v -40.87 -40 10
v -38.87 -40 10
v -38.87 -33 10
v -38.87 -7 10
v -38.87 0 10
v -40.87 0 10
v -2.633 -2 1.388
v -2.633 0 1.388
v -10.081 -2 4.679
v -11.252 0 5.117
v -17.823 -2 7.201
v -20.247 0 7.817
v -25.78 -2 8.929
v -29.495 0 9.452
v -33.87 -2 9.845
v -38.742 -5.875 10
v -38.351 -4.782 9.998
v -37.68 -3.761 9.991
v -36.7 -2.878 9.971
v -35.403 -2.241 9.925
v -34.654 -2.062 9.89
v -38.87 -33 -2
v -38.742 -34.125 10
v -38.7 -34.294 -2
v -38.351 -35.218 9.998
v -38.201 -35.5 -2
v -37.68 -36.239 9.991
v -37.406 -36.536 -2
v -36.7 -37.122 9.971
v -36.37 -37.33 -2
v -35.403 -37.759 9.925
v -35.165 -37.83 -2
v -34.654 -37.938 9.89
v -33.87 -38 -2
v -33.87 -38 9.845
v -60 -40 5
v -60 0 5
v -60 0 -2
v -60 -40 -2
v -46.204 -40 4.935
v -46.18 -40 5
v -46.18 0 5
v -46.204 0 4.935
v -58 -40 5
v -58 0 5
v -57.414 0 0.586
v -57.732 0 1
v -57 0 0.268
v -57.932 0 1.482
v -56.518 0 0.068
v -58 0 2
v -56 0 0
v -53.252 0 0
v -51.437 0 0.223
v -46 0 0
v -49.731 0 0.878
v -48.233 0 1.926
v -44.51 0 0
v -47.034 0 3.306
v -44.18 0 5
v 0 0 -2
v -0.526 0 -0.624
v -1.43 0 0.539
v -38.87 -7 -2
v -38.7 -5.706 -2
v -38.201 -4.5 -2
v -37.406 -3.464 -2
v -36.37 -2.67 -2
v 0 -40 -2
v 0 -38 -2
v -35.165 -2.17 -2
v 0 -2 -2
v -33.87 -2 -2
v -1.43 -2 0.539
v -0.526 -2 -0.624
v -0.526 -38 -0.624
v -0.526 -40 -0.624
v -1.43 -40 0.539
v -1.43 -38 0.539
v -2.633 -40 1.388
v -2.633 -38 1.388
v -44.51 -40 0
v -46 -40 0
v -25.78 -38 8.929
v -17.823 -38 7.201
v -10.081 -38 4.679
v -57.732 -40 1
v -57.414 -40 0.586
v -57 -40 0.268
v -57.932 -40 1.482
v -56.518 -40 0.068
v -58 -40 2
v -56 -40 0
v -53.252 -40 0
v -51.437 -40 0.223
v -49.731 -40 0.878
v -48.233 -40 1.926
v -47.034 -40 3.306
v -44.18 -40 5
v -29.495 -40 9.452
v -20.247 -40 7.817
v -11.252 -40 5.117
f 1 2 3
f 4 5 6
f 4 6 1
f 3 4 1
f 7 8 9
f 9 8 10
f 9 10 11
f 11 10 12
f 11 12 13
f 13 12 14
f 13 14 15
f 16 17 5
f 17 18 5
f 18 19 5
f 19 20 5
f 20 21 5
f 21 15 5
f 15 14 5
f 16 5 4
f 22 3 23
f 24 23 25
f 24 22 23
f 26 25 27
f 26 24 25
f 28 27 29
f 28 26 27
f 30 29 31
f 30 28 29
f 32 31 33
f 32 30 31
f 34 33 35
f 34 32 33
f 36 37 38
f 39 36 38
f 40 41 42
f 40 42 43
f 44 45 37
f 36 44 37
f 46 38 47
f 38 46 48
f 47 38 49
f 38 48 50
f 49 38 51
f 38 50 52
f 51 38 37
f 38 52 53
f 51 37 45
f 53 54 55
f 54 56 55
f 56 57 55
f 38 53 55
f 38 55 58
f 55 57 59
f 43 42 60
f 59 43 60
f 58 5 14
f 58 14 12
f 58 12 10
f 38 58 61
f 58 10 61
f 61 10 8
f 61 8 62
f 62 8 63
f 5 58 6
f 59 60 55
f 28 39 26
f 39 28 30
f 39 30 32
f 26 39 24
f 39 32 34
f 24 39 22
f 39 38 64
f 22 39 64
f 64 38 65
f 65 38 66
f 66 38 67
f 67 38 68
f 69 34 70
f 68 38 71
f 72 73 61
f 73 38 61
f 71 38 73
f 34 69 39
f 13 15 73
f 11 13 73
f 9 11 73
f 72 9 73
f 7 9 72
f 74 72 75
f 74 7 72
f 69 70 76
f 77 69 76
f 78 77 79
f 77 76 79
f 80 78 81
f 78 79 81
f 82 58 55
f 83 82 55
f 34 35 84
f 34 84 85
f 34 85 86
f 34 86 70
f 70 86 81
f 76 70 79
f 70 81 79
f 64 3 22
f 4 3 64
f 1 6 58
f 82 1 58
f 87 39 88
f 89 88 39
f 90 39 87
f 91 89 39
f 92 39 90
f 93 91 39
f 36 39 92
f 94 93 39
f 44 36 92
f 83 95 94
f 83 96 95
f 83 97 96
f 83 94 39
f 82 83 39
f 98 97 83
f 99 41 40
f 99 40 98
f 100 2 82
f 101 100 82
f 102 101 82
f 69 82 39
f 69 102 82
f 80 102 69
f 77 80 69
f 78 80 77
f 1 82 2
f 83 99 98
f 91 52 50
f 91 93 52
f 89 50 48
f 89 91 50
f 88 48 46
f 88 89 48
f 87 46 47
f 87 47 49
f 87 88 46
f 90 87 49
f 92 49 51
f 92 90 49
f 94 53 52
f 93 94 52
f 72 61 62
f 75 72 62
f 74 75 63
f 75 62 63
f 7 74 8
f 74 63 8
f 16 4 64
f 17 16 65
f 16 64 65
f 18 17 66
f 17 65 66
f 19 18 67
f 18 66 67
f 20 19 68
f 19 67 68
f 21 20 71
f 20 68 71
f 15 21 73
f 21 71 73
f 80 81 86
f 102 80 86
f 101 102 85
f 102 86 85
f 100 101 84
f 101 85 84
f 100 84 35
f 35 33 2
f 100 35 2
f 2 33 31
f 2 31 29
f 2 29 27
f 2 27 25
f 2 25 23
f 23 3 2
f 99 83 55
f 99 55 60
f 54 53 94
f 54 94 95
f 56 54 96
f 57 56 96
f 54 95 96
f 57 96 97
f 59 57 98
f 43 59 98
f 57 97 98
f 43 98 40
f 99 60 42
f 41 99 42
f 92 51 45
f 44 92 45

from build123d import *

# Parameters (mm, degrees)
F1_DEPTH    = 40
F2_W        = 38.8704487759
F2_H        = 36
F3_DEPTH    = 25
F4_R        = 7.5
F5_R        = 2
F6_T1_DEPTH = 16.8824680596
F6_T3_DEPTH = 16.8824680596
F7_R        = 5


# Not quite as in the source:
# - a fillet or chamfer that OpenCascade refuses, or shapes differently, is made with other operations: its cross-section is extruded or revolved along the edge and cut away or added


with BuildPart() as f1:
    # F0 (on Front) → F1 (new body)
    with BuildSketch(Plane.XZ):
        with BuildLine():
            Line((-48, 0), (-58, 0))
            Line((-58, 0), (-58, 5))
            Line((-58, 5), (-60, 5))
            Line((-60, 5), (-60, -2))
            Line((-60, -2), (0, -2))
            Line((0, -2), (0, 0))
            ThreePointArc((0, 0), (-18.8023659823, 7.4599490238), (-38.8704487759, 10))
            Line((-38.8704487759, 10), (-40.8704487759, 10))
            Line((-40.8704487759, 10), (-44.5101511185, 0))
            Line((-44.5101511185, 0), (-46, 0))
            Line((-46, 0), (-44.1801488287, 5))
            Line((-44.1801488287, 5), (-46.1801488287, 5))
            Line((-46.1801488287, 5), (-48, 0))
        make_face()
    extrude(amount=F1_DEPTH)

    # F2 (on face) → F3 (cut)
    with BuildSketch(Plane.XY.offset(10)):
        with Locations((-19.4352243879, -20)):
            Rectangle(F2_W, F2_H)
    extrude(amount=-F3_DEPTH, mode=Mode.SUBTRACT)

    # F4
    f4_edges = [f1.edges().sort_by_distance(p)[0] for p in [
        (-48, -20, 0),
    ]]
    fillet(f4_edges, radius=F4_R)

    # F5
    f5_edges = [f1.edges().sort_by_distance(p)[0] for p in [
        (-58, -20, 0),
    ]]
    fillet(f5_edges, radius=F5_R)

    # F6: fillet of radius 5 on 2 edges, made by hand

    # F6_s2 → F6_t1 (cut)
    with BuildSketch(Plane.XZ.offset(30.5587659702)):
        with BuildLine():
            ThreePointArc((0, -2), (-0.9346139409, -0.0091871804), (-2.6330480047, 1.3880102401))
            ThreePointArc((-2.6330480047, 1.3880102401), (-1.3101118631, 0.7061689139), (0, 0))
            Line((0, 0), (0, -2))
        make_face()
    extrude(amount=F6_T1_DEPTH, mode=Mode.SUBTRACT)

    # F6_s4 → F6_t3 (cut)
    with BuildSketch(Plane.XZ.offset(-7.4412340298)):
        with BuildLine():
            ThreePointArc((0, -2), (-0.9346139409, -0.0091871804), (-2.6330480047, 1.3880102401))
            ThreePointArc((-2.6330480047, 1.3880102401), (-1.3101118631, 0.7061689139), (0, 0))
            Line((0, 0), (0, -2))
        make_face()
    extrude(amount=F6_T3_DEPTH, mode=Mode.SUBTRACT)

    # F7
    f7_edges = [f1.edges().sort_by_distance(p)[0] for p in [
        (-38.870449, -38, 4),
        (-38.870449, -2, 4),
    ]]
    fillet(f7_edges, radius=F7_R)


solid = f1.part
